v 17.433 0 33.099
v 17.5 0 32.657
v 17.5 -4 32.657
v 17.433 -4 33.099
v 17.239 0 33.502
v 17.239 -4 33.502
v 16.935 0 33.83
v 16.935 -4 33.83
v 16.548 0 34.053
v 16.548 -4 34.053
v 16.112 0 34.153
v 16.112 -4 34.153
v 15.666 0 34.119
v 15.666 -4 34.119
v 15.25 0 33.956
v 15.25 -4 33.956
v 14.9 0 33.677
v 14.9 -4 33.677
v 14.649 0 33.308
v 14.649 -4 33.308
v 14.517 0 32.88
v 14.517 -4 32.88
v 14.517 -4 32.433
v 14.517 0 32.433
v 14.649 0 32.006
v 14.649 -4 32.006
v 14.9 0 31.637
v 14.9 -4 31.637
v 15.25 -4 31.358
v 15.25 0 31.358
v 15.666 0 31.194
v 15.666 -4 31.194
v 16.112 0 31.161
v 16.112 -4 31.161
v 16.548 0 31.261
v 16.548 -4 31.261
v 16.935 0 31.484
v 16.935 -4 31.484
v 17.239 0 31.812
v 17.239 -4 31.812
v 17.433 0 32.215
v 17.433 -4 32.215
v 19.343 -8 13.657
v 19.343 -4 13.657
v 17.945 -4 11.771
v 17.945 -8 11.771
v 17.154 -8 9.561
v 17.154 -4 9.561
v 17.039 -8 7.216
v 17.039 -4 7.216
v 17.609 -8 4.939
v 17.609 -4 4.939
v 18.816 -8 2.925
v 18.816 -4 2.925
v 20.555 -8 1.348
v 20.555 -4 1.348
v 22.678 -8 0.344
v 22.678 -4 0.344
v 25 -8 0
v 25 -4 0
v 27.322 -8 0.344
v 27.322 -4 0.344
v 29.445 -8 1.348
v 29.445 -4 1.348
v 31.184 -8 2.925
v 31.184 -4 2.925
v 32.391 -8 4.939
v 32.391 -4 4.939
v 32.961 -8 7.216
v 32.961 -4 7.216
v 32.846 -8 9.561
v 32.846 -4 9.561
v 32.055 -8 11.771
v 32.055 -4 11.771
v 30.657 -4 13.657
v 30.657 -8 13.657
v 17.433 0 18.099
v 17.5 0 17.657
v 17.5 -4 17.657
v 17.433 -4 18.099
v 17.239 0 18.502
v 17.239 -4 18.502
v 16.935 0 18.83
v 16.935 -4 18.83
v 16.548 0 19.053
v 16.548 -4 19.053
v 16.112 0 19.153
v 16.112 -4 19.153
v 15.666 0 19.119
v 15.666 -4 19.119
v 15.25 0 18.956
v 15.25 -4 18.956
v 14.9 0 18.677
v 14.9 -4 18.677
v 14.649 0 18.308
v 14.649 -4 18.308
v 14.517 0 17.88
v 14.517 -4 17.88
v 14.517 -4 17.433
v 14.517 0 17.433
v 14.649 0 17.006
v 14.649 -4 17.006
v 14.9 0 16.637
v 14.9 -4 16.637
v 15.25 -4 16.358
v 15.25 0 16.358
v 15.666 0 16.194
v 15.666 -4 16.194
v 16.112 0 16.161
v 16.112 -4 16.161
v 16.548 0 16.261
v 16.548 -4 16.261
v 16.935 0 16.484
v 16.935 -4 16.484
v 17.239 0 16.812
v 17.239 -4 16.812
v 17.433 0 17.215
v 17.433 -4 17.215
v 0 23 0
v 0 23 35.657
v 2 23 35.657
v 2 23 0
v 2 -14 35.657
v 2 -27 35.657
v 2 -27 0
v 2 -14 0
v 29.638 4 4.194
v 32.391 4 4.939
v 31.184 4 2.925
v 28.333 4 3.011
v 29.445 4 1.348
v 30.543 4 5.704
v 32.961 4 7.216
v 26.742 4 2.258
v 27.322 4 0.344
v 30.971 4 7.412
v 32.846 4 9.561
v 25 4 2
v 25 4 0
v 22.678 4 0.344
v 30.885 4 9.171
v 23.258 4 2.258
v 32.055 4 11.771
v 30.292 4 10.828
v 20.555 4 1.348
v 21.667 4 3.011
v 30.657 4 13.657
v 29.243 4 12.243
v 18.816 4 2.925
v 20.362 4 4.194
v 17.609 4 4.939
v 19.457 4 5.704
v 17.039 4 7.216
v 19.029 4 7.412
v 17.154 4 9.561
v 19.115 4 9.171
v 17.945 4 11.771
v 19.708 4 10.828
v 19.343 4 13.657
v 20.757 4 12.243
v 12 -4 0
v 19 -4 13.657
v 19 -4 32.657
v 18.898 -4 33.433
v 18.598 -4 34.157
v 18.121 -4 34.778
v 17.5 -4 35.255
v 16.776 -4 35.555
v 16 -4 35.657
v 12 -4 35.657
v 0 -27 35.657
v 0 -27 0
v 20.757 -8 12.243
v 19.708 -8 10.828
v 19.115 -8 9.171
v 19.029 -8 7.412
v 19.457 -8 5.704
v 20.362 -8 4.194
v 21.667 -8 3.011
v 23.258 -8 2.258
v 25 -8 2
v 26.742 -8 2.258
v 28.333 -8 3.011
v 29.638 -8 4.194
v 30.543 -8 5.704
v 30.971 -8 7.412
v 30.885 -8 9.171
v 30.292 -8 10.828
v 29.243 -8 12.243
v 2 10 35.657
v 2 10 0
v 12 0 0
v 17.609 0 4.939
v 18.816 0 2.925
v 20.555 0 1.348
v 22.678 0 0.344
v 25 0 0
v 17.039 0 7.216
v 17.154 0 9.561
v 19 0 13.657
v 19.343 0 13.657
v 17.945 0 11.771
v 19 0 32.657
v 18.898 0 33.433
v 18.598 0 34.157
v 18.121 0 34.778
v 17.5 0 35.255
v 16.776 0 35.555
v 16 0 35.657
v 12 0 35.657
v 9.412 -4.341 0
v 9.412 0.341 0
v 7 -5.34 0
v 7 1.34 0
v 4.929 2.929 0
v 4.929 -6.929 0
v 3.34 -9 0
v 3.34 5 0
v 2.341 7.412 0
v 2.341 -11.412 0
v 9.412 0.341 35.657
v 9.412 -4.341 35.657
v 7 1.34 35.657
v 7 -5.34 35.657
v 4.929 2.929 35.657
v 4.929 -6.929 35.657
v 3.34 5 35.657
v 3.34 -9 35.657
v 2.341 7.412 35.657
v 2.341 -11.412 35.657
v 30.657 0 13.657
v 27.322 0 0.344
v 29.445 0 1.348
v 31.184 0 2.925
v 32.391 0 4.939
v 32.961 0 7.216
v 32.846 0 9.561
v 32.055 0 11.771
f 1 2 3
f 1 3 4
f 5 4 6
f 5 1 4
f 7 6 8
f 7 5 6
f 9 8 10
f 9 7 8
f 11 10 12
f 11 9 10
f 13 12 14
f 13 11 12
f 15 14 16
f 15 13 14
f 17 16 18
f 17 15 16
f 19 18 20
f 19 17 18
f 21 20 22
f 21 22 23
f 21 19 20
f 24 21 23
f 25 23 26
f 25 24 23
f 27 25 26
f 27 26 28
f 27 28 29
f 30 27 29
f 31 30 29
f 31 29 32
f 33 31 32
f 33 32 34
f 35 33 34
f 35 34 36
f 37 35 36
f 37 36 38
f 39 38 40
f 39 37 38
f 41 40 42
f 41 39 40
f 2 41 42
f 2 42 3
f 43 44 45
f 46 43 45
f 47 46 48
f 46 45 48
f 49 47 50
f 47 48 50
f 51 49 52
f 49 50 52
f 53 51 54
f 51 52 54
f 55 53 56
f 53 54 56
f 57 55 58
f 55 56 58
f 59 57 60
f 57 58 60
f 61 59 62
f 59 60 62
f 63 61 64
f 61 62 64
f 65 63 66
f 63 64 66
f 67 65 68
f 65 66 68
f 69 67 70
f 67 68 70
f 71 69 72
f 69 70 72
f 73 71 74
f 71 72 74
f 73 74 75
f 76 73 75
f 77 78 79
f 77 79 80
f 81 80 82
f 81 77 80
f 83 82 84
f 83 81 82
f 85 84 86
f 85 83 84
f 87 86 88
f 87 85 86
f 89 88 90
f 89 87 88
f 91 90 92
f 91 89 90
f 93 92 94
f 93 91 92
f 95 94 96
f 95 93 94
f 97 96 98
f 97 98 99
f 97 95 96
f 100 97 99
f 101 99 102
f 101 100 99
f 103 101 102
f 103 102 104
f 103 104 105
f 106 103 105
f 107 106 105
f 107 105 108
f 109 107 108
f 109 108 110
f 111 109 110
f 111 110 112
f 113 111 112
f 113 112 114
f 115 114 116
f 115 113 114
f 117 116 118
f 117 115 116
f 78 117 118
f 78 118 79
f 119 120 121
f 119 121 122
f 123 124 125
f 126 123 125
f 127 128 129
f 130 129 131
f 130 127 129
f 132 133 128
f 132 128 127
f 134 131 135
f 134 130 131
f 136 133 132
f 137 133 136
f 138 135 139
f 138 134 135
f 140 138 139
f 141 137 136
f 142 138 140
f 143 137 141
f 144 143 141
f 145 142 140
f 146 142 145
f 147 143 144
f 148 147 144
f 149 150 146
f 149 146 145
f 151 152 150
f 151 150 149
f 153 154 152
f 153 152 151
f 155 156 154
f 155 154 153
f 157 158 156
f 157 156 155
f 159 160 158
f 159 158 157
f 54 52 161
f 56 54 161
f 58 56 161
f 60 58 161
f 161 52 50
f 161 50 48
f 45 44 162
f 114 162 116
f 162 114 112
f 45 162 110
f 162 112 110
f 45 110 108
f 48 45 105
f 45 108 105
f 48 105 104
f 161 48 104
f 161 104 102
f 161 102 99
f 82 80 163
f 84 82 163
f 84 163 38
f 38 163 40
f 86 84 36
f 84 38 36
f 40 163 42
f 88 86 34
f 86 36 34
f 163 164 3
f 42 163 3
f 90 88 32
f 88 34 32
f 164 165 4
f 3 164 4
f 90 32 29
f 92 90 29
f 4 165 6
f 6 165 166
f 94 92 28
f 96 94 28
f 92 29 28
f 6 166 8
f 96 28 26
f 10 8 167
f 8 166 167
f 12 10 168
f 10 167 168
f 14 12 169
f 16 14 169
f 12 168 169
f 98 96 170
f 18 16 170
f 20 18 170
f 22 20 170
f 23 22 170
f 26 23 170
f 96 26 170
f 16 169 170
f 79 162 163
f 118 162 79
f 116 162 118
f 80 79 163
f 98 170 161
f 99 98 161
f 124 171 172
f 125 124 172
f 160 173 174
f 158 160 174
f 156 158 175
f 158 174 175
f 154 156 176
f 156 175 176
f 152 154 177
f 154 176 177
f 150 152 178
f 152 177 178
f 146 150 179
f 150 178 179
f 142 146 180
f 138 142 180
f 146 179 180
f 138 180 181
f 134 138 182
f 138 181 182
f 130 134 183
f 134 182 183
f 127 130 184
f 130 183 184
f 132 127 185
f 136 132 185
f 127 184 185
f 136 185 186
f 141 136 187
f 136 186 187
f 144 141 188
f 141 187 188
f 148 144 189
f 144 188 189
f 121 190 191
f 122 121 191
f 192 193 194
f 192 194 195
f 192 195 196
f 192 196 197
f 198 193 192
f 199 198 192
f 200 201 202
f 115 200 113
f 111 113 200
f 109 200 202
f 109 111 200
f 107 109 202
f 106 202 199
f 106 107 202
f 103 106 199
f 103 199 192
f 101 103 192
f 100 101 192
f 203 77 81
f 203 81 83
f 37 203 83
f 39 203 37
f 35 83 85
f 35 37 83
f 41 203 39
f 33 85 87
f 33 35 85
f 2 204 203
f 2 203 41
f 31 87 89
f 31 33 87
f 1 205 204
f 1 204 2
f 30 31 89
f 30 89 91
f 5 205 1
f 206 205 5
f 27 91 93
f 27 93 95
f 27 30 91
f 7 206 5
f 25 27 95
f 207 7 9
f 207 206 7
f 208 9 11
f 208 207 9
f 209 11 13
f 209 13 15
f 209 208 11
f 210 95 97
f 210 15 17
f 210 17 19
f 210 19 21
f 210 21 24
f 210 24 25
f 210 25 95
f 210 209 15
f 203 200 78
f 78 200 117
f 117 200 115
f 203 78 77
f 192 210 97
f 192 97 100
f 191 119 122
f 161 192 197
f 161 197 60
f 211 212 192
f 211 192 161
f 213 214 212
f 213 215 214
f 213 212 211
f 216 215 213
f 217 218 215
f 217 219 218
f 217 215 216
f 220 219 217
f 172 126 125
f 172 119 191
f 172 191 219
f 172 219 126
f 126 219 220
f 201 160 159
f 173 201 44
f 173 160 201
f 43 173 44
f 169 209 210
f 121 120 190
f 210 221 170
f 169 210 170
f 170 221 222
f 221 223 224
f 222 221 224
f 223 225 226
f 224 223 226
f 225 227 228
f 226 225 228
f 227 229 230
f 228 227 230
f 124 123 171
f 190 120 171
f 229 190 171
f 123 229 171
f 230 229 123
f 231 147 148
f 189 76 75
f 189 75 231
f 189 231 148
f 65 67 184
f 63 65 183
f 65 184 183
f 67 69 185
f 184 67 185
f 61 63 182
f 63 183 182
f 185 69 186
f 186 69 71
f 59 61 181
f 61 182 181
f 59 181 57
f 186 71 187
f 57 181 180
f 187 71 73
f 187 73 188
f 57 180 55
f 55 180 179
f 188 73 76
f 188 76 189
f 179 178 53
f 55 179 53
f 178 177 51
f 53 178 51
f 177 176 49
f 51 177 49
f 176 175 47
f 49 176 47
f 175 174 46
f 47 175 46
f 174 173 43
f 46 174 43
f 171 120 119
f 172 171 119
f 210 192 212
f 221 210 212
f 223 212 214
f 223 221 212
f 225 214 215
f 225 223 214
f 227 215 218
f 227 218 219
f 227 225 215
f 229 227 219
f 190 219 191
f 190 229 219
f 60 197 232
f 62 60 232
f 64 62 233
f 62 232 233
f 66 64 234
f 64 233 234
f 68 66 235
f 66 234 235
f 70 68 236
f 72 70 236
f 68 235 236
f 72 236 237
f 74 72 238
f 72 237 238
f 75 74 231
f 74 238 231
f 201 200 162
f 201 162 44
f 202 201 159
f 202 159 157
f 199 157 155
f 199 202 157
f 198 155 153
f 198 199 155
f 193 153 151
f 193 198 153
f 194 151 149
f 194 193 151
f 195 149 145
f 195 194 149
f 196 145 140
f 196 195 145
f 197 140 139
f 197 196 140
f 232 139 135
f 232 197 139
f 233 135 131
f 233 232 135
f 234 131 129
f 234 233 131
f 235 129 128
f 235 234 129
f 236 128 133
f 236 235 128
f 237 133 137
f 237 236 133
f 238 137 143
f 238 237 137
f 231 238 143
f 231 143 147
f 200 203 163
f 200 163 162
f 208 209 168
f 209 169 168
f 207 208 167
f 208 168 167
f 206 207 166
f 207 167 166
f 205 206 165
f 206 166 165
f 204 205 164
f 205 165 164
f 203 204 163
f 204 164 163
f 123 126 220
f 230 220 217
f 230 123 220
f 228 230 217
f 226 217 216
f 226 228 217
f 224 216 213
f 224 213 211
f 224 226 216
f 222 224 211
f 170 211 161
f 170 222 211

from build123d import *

# Parameters (mm, degrees)
SKETCH_R          = 1.5
PAD_DEPTH         = 4
PAD001_DEPTH      = 4
PAD001_DEPTH_BACK = 8
SKETCH002_W       = 35.656854
SKETCH002_H       = 50
PAD002_DEPTH      = 2
FILLET_R          = 10
FILLET001_R       = 3


with BuildPart() as part:
    # Sketch → Pad (new body)
    with BuildSketch(Plane.XZ):
        with BuildLine():
            ThreePointArc((20.757359, 12.242641), (25, 2), (29.242641, 12.242641))
            Line((30.656854, 13.656854), (29.242641, 12.242641))
            ThreePointArc((24.999973, 0), (32.391031, 4.93852), (30.656854, 13.656854))
            Line((0, 0), (24.999973, 0))
            Line((0, 35.656854), (0, 0))
            Line((0, 35.656854), (19, 35.656854))
            Line((19, 35.656854), (19, 13.656854))
            Line((19, 13.656854), (19.343146, 13.656854))
            Line((19.343146, 13.656854), (20.757359, 12.242641))
        make_face()
        with Locations((16, 32.656854)):
            Circle(SKETCH_R, mode=Mode.SUBTRACT)
        with Locations((16, 17.656854)):
            Circle(SKETCH_R, mode=Mode.SUBTRACT)
    extrude(amount=PAD_DEPTH)

    # Sketch001 → Pad001 (new body, two sides)
    with BuildSketch(Plane.XZ.offset(4)) as pad001_sk:
        with BuildLine():
            ThreePointArc((20.757359, 12.242641), (25, 2), (29.242641, 12.242641))
            Line((30.656854, 13.656854), (29.242641, 12.242641))
            ThreePointArc((19.343146, 13.656854), (25, 0), (30.656854, 13.656854))
            Line((20.757359, 12.242641), (19.343146, 13.656854))
        make_face()
    extrude(amount=PAD001_DEPTH)
    extrude(pad001_sk.sketch, amount=-PAD001_DEPTH_BACK)

    # Sketch002 → Pad002 (new body)
    with BuildSketch(Plane(origin=(0, 0, 0), x_dir=(0, 0, -1), z_dir=(-1, 0, 0))):
        with Locations((-17.828427, 2)):
            Rectangle(SKETCH002_W, SKETCH002_H)
    extrude(amount=-PAD002_DEPTH)

    # Fillet
    fillet_edges = [part.edges().sort_by_distance(p)[0] for p in [
        (2, -4, 17.828427),
        (2, 0, 17.828427),
    ]]
    fillet(fillet_edges, radius=FILLET_R)

    # Fillet001
    fillet001_edges = [part.edges().sort_by_distance(p)[0] for p in [
        (19, -2, 35.656854),
    ]]
    fillet(fillet001_edges, radius=FILLET001_R)


solid = part.part
